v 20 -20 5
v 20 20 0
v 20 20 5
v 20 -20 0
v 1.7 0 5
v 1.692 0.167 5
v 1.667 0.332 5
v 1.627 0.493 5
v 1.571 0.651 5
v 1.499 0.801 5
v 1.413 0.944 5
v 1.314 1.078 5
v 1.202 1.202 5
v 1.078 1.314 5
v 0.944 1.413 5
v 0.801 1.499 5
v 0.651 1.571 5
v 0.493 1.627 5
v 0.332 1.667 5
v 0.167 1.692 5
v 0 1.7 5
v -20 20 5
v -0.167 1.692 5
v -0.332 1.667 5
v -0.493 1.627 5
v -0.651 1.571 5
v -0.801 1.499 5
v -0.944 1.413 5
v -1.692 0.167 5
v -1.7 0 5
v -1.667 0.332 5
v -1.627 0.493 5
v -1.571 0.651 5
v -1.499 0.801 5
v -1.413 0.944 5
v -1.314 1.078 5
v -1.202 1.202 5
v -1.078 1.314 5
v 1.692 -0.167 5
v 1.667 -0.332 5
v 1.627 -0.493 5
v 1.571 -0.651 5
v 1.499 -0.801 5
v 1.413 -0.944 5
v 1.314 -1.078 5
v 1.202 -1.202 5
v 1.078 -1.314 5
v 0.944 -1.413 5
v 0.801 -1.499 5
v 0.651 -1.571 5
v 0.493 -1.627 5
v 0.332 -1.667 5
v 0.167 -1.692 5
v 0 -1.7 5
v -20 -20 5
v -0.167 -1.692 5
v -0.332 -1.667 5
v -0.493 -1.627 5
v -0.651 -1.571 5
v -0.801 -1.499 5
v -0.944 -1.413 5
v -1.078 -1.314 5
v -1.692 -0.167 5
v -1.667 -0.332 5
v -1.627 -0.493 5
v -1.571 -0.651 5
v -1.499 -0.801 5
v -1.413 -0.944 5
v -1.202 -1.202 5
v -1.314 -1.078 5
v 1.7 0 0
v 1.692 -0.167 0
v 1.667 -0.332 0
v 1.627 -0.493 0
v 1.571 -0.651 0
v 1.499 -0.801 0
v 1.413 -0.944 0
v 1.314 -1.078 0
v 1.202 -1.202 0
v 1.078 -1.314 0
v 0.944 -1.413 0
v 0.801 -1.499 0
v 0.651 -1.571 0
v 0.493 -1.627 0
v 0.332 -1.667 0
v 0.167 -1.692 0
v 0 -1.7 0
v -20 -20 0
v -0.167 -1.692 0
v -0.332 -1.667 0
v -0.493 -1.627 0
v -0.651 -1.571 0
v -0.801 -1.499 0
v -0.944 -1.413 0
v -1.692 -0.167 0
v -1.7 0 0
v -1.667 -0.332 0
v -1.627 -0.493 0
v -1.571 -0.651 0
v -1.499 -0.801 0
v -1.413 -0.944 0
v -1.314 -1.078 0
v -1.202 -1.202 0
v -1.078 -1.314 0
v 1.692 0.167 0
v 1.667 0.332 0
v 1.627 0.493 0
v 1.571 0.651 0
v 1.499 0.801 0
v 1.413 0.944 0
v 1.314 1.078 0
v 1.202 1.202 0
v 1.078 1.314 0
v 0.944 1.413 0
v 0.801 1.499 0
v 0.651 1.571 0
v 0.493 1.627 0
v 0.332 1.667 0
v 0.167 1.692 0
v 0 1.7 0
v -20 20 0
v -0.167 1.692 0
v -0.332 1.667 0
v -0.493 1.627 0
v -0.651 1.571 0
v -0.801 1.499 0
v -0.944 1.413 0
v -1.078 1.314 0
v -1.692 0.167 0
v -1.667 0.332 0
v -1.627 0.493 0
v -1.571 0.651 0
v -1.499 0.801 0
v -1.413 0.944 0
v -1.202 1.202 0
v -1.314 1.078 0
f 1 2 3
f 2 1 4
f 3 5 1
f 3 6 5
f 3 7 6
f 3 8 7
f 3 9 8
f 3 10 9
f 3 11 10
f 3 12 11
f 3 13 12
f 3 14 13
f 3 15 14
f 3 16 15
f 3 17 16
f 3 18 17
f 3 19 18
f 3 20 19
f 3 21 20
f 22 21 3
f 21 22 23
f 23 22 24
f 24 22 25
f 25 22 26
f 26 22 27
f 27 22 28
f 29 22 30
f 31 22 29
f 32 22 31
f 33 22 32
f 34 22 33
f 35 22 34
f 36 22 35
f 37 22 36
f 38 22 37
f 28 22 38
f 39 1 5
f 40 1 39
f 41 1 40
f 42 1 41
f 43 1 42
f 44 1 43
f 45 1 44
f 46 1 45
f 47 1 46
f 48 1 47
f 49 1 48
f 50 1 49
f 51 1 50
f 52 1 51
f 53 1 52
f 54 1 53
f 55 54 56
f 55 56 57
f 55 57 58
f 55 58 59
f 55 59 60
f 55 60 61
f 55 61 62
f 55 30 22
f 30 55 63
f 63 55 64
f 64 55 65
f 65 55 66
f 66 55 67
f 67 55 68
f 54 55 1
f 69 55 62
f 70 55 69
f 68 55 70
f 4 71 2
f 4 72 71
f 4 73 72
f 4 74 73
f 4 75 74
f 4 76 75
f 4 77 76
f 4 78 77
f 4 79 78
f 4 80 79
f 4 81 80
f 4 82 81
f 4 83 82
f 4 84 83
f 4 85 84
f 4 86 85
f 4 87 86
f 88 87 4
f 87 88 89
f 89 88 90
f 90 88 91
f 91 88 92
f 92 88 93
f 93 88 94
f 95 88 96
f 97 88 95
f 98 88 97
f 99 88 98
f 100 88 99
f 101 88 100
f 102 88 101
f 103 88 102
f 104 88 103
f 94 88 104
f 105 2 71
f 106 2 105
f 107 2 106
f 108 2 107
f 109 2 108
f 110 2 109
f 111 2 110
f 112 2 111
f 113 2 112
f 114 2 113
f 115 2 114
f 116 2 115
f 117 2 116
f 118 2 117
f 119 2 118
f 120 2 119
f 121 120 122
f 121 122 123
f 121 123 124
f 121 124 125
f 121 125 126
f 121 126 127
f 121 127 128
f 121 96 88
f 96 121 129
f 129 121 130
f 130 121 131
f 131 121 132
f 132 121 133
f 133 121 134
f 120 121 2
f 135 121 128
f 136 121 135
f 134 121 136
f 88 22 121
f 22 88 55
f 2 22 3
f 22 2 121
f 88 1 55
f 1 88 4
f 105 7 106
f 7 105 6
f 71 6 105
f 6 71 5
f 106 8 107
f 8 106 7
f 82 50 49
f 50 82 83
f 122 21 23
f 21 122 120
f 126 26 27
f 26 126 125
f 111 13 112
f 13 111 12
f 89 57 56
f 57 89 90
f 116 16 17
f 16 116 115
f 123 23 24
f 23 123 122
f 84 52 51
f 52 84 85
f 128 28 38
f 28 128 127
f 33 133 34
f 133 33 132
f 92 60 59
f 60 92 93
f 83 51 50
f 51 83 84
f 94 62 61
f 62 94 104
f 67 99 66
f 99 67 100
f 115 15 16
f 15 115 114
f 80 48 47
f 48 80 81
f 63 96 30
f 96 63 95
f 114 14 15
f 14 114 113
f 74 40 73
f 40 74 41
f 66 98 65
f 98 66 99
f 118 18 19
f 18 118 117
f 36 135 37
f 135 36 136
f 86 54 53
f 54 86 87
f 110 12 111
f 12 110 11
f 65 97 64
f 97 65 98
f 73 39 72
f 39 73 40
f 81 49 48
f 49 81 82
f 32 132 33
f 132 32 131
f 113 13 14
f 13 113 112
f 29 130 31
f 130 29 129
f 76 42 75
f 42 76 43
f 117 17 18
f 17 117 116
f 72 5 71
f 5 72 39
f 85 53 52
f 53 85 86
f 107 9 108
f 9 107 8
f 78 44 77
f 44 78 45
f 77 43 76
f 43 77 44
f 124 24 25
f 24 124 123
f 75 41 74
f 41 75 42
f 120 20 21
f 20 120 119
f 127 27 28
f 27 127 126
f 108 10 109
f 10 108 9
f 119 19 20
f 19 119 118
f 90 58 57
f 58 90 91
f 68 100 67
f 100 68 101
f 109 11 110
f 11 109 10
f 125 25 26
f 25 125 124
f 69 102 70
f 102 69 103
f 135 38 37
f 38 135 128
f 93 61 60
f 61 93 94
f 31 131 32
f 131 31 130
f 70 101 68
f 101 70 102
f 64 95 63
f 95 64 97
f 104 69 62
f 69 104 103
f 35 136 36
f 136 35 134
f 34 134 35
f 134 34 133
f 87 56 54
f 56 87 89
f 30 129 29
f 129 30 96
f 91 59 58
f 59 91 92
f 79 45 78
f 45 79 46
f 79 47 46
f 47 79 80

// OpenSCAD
// ============================================================
// Zone 2 Foam Gear - Print Parts
// ============================================================
// Individual parts for 3D printing
// Select part using PART_SELECT parameter
// ============================================================

// === PART SELECTION ===
// 1 = Base plate
// 2 = Gear only
// 3 = Shaft
// 4 = Gear + arm + foam as one piece
PART_SELECT = 1;

// === PARAMETERS ===
// Gear parameters
gear_teeth = 12;
gear_module = 1.0;
gear_pitch_radius = gear_teeth * gear_module / 2;  // 6mm
gear_outer_radius = gear_pitch_radius + gear_module;  // 7mm
gear_thickness = 5;
gear_shaft_hole = 3.3;  // 3mm shaft + 0.3mm clearance

// Shaft parameters
shaft_diameter = 3;
shaft_height = 15;

// Arm parameters
arm_length = 15;
arm_width = 4;
arm_thickness = 3;

// Foam parameters (MEDIUM)
foam_diameter = 12;

// Base plate parameters
base_width = 40;
base_depth = 40;
base_height = 5;

// Smoothness
$fn = 64;

// === MODULES ===

// Simple gear with teeth
module simple_gear(teeth, mod, thickness, bore) {
    pitch_r = teeth * mod / 2;
    outer_r = pitch_r + mod;
    root_r = pitch_r - 1.25 * mod;
    tooth_angle = 360 / teeth;

    difference() {
        union() {
            // Root cylinder
            cylinder(h=thickness, r=root_r);

            // Teeth
            for (i = [0:teeth-1]) {
                rotate([0, 0, i * tooth_angle])
                hull() {
                    translate([root_r - 0.5, 0, 0])
                        cylinder(h=thickness, r=0.5);
                    translate([outer_r - 0.3, 0, 0])
                        cylinder(h=thickness, r=0.3);
                }
            }
        }

        // Center bore
        translate([0, 0, -0.1])
            cylinder(h=thickness + 0.2, d=bore);
    }
}

// Foam arm
module foam_arm(length, width, thickness) {
    hull() {
        cylinder(h=thickness, d=width);
        translate([length - width/2, 0, 0])
            cylinder(h=thickness, d=width);
    }
}

// Foam piece (MEDIUM size)
module foam_piece(diameter) {
    sphere(d=diameter);
}

// === PART 1: Base Plate ===
module part_base_plate() {
    difference() {
        translate([-base_width/2, -base_depth/2, 0])
            cube([base_width, base_depth, base_height]);

        // Shaft hole with clearance
        translate([0, 0, -0.1])
            cylinder(h=base_height + 0.2, d=shaft_diameter + 0.4);
    }
}

// === PART 2: Gear Only ===
module part_gear() {
    simple_gear(gear_teeth, gear_module, gear_thickness, gear_shaft_hole);
}

// === PART 3: Shaft ===
module part_shaft() {
    cylinder(h=shaft_height, d=shaft_diameter);
}

// === PART 4: Gear + Arm + Foam Combined ===
module part_gear_arm_foam() {
    union() {
        // Gear
        simple_gear(gear_teeth, gear_module, gear_thickness, gear_shaft_hole);

        // Arm on top of gear
        translate([0, 0, gear_thickness])
            foam_arm(arm_length, arm_width, arm_thickness);

        // Foam piece at end of arm
        // Positioned so bottom of sphere meets arm
        translate([arm_length, 0, gear_thickness + arm_thickness + foam_diameter/2 - 1])
            foam_piece(foam_diameter);
    }
}

// === RENDER SELECTED PART ===

echo(str("Rendering Part: ", PART_SELECT));

if (PART_SELECT == 1) {
    echo("Part 1: Base Plate");
    echo(str("Dimensions: ", base_width, " x ", base_depth, " x ", base_height, " mm"));
    part_base_plate();
}
else if (PART_SELECT == 2) {
    echo("Part 2: Gear Only");
    echo(str("Teeth: ", gear_teeth, ", Pitch radius: ", gear_pitch_radius, " mm"));
    part_gear();
}
else if (PART_SELECT == 3) {
    echo("Part 3: Shaft");
    echo(str("Diameter: ", shaft_diameter, " mm, Height: ", shaft_height, " mm"));
    part_shaft();
}
else if (PART_SELECT == 4) {
    echo("Part 4: Gear + Arm + Foam Combined");
    echo("Print with supports for foam overhang");
    part_gear_arm_foam();
}
else {
    echo("Invalid PART_SELECT. Use 1-4.");
}
